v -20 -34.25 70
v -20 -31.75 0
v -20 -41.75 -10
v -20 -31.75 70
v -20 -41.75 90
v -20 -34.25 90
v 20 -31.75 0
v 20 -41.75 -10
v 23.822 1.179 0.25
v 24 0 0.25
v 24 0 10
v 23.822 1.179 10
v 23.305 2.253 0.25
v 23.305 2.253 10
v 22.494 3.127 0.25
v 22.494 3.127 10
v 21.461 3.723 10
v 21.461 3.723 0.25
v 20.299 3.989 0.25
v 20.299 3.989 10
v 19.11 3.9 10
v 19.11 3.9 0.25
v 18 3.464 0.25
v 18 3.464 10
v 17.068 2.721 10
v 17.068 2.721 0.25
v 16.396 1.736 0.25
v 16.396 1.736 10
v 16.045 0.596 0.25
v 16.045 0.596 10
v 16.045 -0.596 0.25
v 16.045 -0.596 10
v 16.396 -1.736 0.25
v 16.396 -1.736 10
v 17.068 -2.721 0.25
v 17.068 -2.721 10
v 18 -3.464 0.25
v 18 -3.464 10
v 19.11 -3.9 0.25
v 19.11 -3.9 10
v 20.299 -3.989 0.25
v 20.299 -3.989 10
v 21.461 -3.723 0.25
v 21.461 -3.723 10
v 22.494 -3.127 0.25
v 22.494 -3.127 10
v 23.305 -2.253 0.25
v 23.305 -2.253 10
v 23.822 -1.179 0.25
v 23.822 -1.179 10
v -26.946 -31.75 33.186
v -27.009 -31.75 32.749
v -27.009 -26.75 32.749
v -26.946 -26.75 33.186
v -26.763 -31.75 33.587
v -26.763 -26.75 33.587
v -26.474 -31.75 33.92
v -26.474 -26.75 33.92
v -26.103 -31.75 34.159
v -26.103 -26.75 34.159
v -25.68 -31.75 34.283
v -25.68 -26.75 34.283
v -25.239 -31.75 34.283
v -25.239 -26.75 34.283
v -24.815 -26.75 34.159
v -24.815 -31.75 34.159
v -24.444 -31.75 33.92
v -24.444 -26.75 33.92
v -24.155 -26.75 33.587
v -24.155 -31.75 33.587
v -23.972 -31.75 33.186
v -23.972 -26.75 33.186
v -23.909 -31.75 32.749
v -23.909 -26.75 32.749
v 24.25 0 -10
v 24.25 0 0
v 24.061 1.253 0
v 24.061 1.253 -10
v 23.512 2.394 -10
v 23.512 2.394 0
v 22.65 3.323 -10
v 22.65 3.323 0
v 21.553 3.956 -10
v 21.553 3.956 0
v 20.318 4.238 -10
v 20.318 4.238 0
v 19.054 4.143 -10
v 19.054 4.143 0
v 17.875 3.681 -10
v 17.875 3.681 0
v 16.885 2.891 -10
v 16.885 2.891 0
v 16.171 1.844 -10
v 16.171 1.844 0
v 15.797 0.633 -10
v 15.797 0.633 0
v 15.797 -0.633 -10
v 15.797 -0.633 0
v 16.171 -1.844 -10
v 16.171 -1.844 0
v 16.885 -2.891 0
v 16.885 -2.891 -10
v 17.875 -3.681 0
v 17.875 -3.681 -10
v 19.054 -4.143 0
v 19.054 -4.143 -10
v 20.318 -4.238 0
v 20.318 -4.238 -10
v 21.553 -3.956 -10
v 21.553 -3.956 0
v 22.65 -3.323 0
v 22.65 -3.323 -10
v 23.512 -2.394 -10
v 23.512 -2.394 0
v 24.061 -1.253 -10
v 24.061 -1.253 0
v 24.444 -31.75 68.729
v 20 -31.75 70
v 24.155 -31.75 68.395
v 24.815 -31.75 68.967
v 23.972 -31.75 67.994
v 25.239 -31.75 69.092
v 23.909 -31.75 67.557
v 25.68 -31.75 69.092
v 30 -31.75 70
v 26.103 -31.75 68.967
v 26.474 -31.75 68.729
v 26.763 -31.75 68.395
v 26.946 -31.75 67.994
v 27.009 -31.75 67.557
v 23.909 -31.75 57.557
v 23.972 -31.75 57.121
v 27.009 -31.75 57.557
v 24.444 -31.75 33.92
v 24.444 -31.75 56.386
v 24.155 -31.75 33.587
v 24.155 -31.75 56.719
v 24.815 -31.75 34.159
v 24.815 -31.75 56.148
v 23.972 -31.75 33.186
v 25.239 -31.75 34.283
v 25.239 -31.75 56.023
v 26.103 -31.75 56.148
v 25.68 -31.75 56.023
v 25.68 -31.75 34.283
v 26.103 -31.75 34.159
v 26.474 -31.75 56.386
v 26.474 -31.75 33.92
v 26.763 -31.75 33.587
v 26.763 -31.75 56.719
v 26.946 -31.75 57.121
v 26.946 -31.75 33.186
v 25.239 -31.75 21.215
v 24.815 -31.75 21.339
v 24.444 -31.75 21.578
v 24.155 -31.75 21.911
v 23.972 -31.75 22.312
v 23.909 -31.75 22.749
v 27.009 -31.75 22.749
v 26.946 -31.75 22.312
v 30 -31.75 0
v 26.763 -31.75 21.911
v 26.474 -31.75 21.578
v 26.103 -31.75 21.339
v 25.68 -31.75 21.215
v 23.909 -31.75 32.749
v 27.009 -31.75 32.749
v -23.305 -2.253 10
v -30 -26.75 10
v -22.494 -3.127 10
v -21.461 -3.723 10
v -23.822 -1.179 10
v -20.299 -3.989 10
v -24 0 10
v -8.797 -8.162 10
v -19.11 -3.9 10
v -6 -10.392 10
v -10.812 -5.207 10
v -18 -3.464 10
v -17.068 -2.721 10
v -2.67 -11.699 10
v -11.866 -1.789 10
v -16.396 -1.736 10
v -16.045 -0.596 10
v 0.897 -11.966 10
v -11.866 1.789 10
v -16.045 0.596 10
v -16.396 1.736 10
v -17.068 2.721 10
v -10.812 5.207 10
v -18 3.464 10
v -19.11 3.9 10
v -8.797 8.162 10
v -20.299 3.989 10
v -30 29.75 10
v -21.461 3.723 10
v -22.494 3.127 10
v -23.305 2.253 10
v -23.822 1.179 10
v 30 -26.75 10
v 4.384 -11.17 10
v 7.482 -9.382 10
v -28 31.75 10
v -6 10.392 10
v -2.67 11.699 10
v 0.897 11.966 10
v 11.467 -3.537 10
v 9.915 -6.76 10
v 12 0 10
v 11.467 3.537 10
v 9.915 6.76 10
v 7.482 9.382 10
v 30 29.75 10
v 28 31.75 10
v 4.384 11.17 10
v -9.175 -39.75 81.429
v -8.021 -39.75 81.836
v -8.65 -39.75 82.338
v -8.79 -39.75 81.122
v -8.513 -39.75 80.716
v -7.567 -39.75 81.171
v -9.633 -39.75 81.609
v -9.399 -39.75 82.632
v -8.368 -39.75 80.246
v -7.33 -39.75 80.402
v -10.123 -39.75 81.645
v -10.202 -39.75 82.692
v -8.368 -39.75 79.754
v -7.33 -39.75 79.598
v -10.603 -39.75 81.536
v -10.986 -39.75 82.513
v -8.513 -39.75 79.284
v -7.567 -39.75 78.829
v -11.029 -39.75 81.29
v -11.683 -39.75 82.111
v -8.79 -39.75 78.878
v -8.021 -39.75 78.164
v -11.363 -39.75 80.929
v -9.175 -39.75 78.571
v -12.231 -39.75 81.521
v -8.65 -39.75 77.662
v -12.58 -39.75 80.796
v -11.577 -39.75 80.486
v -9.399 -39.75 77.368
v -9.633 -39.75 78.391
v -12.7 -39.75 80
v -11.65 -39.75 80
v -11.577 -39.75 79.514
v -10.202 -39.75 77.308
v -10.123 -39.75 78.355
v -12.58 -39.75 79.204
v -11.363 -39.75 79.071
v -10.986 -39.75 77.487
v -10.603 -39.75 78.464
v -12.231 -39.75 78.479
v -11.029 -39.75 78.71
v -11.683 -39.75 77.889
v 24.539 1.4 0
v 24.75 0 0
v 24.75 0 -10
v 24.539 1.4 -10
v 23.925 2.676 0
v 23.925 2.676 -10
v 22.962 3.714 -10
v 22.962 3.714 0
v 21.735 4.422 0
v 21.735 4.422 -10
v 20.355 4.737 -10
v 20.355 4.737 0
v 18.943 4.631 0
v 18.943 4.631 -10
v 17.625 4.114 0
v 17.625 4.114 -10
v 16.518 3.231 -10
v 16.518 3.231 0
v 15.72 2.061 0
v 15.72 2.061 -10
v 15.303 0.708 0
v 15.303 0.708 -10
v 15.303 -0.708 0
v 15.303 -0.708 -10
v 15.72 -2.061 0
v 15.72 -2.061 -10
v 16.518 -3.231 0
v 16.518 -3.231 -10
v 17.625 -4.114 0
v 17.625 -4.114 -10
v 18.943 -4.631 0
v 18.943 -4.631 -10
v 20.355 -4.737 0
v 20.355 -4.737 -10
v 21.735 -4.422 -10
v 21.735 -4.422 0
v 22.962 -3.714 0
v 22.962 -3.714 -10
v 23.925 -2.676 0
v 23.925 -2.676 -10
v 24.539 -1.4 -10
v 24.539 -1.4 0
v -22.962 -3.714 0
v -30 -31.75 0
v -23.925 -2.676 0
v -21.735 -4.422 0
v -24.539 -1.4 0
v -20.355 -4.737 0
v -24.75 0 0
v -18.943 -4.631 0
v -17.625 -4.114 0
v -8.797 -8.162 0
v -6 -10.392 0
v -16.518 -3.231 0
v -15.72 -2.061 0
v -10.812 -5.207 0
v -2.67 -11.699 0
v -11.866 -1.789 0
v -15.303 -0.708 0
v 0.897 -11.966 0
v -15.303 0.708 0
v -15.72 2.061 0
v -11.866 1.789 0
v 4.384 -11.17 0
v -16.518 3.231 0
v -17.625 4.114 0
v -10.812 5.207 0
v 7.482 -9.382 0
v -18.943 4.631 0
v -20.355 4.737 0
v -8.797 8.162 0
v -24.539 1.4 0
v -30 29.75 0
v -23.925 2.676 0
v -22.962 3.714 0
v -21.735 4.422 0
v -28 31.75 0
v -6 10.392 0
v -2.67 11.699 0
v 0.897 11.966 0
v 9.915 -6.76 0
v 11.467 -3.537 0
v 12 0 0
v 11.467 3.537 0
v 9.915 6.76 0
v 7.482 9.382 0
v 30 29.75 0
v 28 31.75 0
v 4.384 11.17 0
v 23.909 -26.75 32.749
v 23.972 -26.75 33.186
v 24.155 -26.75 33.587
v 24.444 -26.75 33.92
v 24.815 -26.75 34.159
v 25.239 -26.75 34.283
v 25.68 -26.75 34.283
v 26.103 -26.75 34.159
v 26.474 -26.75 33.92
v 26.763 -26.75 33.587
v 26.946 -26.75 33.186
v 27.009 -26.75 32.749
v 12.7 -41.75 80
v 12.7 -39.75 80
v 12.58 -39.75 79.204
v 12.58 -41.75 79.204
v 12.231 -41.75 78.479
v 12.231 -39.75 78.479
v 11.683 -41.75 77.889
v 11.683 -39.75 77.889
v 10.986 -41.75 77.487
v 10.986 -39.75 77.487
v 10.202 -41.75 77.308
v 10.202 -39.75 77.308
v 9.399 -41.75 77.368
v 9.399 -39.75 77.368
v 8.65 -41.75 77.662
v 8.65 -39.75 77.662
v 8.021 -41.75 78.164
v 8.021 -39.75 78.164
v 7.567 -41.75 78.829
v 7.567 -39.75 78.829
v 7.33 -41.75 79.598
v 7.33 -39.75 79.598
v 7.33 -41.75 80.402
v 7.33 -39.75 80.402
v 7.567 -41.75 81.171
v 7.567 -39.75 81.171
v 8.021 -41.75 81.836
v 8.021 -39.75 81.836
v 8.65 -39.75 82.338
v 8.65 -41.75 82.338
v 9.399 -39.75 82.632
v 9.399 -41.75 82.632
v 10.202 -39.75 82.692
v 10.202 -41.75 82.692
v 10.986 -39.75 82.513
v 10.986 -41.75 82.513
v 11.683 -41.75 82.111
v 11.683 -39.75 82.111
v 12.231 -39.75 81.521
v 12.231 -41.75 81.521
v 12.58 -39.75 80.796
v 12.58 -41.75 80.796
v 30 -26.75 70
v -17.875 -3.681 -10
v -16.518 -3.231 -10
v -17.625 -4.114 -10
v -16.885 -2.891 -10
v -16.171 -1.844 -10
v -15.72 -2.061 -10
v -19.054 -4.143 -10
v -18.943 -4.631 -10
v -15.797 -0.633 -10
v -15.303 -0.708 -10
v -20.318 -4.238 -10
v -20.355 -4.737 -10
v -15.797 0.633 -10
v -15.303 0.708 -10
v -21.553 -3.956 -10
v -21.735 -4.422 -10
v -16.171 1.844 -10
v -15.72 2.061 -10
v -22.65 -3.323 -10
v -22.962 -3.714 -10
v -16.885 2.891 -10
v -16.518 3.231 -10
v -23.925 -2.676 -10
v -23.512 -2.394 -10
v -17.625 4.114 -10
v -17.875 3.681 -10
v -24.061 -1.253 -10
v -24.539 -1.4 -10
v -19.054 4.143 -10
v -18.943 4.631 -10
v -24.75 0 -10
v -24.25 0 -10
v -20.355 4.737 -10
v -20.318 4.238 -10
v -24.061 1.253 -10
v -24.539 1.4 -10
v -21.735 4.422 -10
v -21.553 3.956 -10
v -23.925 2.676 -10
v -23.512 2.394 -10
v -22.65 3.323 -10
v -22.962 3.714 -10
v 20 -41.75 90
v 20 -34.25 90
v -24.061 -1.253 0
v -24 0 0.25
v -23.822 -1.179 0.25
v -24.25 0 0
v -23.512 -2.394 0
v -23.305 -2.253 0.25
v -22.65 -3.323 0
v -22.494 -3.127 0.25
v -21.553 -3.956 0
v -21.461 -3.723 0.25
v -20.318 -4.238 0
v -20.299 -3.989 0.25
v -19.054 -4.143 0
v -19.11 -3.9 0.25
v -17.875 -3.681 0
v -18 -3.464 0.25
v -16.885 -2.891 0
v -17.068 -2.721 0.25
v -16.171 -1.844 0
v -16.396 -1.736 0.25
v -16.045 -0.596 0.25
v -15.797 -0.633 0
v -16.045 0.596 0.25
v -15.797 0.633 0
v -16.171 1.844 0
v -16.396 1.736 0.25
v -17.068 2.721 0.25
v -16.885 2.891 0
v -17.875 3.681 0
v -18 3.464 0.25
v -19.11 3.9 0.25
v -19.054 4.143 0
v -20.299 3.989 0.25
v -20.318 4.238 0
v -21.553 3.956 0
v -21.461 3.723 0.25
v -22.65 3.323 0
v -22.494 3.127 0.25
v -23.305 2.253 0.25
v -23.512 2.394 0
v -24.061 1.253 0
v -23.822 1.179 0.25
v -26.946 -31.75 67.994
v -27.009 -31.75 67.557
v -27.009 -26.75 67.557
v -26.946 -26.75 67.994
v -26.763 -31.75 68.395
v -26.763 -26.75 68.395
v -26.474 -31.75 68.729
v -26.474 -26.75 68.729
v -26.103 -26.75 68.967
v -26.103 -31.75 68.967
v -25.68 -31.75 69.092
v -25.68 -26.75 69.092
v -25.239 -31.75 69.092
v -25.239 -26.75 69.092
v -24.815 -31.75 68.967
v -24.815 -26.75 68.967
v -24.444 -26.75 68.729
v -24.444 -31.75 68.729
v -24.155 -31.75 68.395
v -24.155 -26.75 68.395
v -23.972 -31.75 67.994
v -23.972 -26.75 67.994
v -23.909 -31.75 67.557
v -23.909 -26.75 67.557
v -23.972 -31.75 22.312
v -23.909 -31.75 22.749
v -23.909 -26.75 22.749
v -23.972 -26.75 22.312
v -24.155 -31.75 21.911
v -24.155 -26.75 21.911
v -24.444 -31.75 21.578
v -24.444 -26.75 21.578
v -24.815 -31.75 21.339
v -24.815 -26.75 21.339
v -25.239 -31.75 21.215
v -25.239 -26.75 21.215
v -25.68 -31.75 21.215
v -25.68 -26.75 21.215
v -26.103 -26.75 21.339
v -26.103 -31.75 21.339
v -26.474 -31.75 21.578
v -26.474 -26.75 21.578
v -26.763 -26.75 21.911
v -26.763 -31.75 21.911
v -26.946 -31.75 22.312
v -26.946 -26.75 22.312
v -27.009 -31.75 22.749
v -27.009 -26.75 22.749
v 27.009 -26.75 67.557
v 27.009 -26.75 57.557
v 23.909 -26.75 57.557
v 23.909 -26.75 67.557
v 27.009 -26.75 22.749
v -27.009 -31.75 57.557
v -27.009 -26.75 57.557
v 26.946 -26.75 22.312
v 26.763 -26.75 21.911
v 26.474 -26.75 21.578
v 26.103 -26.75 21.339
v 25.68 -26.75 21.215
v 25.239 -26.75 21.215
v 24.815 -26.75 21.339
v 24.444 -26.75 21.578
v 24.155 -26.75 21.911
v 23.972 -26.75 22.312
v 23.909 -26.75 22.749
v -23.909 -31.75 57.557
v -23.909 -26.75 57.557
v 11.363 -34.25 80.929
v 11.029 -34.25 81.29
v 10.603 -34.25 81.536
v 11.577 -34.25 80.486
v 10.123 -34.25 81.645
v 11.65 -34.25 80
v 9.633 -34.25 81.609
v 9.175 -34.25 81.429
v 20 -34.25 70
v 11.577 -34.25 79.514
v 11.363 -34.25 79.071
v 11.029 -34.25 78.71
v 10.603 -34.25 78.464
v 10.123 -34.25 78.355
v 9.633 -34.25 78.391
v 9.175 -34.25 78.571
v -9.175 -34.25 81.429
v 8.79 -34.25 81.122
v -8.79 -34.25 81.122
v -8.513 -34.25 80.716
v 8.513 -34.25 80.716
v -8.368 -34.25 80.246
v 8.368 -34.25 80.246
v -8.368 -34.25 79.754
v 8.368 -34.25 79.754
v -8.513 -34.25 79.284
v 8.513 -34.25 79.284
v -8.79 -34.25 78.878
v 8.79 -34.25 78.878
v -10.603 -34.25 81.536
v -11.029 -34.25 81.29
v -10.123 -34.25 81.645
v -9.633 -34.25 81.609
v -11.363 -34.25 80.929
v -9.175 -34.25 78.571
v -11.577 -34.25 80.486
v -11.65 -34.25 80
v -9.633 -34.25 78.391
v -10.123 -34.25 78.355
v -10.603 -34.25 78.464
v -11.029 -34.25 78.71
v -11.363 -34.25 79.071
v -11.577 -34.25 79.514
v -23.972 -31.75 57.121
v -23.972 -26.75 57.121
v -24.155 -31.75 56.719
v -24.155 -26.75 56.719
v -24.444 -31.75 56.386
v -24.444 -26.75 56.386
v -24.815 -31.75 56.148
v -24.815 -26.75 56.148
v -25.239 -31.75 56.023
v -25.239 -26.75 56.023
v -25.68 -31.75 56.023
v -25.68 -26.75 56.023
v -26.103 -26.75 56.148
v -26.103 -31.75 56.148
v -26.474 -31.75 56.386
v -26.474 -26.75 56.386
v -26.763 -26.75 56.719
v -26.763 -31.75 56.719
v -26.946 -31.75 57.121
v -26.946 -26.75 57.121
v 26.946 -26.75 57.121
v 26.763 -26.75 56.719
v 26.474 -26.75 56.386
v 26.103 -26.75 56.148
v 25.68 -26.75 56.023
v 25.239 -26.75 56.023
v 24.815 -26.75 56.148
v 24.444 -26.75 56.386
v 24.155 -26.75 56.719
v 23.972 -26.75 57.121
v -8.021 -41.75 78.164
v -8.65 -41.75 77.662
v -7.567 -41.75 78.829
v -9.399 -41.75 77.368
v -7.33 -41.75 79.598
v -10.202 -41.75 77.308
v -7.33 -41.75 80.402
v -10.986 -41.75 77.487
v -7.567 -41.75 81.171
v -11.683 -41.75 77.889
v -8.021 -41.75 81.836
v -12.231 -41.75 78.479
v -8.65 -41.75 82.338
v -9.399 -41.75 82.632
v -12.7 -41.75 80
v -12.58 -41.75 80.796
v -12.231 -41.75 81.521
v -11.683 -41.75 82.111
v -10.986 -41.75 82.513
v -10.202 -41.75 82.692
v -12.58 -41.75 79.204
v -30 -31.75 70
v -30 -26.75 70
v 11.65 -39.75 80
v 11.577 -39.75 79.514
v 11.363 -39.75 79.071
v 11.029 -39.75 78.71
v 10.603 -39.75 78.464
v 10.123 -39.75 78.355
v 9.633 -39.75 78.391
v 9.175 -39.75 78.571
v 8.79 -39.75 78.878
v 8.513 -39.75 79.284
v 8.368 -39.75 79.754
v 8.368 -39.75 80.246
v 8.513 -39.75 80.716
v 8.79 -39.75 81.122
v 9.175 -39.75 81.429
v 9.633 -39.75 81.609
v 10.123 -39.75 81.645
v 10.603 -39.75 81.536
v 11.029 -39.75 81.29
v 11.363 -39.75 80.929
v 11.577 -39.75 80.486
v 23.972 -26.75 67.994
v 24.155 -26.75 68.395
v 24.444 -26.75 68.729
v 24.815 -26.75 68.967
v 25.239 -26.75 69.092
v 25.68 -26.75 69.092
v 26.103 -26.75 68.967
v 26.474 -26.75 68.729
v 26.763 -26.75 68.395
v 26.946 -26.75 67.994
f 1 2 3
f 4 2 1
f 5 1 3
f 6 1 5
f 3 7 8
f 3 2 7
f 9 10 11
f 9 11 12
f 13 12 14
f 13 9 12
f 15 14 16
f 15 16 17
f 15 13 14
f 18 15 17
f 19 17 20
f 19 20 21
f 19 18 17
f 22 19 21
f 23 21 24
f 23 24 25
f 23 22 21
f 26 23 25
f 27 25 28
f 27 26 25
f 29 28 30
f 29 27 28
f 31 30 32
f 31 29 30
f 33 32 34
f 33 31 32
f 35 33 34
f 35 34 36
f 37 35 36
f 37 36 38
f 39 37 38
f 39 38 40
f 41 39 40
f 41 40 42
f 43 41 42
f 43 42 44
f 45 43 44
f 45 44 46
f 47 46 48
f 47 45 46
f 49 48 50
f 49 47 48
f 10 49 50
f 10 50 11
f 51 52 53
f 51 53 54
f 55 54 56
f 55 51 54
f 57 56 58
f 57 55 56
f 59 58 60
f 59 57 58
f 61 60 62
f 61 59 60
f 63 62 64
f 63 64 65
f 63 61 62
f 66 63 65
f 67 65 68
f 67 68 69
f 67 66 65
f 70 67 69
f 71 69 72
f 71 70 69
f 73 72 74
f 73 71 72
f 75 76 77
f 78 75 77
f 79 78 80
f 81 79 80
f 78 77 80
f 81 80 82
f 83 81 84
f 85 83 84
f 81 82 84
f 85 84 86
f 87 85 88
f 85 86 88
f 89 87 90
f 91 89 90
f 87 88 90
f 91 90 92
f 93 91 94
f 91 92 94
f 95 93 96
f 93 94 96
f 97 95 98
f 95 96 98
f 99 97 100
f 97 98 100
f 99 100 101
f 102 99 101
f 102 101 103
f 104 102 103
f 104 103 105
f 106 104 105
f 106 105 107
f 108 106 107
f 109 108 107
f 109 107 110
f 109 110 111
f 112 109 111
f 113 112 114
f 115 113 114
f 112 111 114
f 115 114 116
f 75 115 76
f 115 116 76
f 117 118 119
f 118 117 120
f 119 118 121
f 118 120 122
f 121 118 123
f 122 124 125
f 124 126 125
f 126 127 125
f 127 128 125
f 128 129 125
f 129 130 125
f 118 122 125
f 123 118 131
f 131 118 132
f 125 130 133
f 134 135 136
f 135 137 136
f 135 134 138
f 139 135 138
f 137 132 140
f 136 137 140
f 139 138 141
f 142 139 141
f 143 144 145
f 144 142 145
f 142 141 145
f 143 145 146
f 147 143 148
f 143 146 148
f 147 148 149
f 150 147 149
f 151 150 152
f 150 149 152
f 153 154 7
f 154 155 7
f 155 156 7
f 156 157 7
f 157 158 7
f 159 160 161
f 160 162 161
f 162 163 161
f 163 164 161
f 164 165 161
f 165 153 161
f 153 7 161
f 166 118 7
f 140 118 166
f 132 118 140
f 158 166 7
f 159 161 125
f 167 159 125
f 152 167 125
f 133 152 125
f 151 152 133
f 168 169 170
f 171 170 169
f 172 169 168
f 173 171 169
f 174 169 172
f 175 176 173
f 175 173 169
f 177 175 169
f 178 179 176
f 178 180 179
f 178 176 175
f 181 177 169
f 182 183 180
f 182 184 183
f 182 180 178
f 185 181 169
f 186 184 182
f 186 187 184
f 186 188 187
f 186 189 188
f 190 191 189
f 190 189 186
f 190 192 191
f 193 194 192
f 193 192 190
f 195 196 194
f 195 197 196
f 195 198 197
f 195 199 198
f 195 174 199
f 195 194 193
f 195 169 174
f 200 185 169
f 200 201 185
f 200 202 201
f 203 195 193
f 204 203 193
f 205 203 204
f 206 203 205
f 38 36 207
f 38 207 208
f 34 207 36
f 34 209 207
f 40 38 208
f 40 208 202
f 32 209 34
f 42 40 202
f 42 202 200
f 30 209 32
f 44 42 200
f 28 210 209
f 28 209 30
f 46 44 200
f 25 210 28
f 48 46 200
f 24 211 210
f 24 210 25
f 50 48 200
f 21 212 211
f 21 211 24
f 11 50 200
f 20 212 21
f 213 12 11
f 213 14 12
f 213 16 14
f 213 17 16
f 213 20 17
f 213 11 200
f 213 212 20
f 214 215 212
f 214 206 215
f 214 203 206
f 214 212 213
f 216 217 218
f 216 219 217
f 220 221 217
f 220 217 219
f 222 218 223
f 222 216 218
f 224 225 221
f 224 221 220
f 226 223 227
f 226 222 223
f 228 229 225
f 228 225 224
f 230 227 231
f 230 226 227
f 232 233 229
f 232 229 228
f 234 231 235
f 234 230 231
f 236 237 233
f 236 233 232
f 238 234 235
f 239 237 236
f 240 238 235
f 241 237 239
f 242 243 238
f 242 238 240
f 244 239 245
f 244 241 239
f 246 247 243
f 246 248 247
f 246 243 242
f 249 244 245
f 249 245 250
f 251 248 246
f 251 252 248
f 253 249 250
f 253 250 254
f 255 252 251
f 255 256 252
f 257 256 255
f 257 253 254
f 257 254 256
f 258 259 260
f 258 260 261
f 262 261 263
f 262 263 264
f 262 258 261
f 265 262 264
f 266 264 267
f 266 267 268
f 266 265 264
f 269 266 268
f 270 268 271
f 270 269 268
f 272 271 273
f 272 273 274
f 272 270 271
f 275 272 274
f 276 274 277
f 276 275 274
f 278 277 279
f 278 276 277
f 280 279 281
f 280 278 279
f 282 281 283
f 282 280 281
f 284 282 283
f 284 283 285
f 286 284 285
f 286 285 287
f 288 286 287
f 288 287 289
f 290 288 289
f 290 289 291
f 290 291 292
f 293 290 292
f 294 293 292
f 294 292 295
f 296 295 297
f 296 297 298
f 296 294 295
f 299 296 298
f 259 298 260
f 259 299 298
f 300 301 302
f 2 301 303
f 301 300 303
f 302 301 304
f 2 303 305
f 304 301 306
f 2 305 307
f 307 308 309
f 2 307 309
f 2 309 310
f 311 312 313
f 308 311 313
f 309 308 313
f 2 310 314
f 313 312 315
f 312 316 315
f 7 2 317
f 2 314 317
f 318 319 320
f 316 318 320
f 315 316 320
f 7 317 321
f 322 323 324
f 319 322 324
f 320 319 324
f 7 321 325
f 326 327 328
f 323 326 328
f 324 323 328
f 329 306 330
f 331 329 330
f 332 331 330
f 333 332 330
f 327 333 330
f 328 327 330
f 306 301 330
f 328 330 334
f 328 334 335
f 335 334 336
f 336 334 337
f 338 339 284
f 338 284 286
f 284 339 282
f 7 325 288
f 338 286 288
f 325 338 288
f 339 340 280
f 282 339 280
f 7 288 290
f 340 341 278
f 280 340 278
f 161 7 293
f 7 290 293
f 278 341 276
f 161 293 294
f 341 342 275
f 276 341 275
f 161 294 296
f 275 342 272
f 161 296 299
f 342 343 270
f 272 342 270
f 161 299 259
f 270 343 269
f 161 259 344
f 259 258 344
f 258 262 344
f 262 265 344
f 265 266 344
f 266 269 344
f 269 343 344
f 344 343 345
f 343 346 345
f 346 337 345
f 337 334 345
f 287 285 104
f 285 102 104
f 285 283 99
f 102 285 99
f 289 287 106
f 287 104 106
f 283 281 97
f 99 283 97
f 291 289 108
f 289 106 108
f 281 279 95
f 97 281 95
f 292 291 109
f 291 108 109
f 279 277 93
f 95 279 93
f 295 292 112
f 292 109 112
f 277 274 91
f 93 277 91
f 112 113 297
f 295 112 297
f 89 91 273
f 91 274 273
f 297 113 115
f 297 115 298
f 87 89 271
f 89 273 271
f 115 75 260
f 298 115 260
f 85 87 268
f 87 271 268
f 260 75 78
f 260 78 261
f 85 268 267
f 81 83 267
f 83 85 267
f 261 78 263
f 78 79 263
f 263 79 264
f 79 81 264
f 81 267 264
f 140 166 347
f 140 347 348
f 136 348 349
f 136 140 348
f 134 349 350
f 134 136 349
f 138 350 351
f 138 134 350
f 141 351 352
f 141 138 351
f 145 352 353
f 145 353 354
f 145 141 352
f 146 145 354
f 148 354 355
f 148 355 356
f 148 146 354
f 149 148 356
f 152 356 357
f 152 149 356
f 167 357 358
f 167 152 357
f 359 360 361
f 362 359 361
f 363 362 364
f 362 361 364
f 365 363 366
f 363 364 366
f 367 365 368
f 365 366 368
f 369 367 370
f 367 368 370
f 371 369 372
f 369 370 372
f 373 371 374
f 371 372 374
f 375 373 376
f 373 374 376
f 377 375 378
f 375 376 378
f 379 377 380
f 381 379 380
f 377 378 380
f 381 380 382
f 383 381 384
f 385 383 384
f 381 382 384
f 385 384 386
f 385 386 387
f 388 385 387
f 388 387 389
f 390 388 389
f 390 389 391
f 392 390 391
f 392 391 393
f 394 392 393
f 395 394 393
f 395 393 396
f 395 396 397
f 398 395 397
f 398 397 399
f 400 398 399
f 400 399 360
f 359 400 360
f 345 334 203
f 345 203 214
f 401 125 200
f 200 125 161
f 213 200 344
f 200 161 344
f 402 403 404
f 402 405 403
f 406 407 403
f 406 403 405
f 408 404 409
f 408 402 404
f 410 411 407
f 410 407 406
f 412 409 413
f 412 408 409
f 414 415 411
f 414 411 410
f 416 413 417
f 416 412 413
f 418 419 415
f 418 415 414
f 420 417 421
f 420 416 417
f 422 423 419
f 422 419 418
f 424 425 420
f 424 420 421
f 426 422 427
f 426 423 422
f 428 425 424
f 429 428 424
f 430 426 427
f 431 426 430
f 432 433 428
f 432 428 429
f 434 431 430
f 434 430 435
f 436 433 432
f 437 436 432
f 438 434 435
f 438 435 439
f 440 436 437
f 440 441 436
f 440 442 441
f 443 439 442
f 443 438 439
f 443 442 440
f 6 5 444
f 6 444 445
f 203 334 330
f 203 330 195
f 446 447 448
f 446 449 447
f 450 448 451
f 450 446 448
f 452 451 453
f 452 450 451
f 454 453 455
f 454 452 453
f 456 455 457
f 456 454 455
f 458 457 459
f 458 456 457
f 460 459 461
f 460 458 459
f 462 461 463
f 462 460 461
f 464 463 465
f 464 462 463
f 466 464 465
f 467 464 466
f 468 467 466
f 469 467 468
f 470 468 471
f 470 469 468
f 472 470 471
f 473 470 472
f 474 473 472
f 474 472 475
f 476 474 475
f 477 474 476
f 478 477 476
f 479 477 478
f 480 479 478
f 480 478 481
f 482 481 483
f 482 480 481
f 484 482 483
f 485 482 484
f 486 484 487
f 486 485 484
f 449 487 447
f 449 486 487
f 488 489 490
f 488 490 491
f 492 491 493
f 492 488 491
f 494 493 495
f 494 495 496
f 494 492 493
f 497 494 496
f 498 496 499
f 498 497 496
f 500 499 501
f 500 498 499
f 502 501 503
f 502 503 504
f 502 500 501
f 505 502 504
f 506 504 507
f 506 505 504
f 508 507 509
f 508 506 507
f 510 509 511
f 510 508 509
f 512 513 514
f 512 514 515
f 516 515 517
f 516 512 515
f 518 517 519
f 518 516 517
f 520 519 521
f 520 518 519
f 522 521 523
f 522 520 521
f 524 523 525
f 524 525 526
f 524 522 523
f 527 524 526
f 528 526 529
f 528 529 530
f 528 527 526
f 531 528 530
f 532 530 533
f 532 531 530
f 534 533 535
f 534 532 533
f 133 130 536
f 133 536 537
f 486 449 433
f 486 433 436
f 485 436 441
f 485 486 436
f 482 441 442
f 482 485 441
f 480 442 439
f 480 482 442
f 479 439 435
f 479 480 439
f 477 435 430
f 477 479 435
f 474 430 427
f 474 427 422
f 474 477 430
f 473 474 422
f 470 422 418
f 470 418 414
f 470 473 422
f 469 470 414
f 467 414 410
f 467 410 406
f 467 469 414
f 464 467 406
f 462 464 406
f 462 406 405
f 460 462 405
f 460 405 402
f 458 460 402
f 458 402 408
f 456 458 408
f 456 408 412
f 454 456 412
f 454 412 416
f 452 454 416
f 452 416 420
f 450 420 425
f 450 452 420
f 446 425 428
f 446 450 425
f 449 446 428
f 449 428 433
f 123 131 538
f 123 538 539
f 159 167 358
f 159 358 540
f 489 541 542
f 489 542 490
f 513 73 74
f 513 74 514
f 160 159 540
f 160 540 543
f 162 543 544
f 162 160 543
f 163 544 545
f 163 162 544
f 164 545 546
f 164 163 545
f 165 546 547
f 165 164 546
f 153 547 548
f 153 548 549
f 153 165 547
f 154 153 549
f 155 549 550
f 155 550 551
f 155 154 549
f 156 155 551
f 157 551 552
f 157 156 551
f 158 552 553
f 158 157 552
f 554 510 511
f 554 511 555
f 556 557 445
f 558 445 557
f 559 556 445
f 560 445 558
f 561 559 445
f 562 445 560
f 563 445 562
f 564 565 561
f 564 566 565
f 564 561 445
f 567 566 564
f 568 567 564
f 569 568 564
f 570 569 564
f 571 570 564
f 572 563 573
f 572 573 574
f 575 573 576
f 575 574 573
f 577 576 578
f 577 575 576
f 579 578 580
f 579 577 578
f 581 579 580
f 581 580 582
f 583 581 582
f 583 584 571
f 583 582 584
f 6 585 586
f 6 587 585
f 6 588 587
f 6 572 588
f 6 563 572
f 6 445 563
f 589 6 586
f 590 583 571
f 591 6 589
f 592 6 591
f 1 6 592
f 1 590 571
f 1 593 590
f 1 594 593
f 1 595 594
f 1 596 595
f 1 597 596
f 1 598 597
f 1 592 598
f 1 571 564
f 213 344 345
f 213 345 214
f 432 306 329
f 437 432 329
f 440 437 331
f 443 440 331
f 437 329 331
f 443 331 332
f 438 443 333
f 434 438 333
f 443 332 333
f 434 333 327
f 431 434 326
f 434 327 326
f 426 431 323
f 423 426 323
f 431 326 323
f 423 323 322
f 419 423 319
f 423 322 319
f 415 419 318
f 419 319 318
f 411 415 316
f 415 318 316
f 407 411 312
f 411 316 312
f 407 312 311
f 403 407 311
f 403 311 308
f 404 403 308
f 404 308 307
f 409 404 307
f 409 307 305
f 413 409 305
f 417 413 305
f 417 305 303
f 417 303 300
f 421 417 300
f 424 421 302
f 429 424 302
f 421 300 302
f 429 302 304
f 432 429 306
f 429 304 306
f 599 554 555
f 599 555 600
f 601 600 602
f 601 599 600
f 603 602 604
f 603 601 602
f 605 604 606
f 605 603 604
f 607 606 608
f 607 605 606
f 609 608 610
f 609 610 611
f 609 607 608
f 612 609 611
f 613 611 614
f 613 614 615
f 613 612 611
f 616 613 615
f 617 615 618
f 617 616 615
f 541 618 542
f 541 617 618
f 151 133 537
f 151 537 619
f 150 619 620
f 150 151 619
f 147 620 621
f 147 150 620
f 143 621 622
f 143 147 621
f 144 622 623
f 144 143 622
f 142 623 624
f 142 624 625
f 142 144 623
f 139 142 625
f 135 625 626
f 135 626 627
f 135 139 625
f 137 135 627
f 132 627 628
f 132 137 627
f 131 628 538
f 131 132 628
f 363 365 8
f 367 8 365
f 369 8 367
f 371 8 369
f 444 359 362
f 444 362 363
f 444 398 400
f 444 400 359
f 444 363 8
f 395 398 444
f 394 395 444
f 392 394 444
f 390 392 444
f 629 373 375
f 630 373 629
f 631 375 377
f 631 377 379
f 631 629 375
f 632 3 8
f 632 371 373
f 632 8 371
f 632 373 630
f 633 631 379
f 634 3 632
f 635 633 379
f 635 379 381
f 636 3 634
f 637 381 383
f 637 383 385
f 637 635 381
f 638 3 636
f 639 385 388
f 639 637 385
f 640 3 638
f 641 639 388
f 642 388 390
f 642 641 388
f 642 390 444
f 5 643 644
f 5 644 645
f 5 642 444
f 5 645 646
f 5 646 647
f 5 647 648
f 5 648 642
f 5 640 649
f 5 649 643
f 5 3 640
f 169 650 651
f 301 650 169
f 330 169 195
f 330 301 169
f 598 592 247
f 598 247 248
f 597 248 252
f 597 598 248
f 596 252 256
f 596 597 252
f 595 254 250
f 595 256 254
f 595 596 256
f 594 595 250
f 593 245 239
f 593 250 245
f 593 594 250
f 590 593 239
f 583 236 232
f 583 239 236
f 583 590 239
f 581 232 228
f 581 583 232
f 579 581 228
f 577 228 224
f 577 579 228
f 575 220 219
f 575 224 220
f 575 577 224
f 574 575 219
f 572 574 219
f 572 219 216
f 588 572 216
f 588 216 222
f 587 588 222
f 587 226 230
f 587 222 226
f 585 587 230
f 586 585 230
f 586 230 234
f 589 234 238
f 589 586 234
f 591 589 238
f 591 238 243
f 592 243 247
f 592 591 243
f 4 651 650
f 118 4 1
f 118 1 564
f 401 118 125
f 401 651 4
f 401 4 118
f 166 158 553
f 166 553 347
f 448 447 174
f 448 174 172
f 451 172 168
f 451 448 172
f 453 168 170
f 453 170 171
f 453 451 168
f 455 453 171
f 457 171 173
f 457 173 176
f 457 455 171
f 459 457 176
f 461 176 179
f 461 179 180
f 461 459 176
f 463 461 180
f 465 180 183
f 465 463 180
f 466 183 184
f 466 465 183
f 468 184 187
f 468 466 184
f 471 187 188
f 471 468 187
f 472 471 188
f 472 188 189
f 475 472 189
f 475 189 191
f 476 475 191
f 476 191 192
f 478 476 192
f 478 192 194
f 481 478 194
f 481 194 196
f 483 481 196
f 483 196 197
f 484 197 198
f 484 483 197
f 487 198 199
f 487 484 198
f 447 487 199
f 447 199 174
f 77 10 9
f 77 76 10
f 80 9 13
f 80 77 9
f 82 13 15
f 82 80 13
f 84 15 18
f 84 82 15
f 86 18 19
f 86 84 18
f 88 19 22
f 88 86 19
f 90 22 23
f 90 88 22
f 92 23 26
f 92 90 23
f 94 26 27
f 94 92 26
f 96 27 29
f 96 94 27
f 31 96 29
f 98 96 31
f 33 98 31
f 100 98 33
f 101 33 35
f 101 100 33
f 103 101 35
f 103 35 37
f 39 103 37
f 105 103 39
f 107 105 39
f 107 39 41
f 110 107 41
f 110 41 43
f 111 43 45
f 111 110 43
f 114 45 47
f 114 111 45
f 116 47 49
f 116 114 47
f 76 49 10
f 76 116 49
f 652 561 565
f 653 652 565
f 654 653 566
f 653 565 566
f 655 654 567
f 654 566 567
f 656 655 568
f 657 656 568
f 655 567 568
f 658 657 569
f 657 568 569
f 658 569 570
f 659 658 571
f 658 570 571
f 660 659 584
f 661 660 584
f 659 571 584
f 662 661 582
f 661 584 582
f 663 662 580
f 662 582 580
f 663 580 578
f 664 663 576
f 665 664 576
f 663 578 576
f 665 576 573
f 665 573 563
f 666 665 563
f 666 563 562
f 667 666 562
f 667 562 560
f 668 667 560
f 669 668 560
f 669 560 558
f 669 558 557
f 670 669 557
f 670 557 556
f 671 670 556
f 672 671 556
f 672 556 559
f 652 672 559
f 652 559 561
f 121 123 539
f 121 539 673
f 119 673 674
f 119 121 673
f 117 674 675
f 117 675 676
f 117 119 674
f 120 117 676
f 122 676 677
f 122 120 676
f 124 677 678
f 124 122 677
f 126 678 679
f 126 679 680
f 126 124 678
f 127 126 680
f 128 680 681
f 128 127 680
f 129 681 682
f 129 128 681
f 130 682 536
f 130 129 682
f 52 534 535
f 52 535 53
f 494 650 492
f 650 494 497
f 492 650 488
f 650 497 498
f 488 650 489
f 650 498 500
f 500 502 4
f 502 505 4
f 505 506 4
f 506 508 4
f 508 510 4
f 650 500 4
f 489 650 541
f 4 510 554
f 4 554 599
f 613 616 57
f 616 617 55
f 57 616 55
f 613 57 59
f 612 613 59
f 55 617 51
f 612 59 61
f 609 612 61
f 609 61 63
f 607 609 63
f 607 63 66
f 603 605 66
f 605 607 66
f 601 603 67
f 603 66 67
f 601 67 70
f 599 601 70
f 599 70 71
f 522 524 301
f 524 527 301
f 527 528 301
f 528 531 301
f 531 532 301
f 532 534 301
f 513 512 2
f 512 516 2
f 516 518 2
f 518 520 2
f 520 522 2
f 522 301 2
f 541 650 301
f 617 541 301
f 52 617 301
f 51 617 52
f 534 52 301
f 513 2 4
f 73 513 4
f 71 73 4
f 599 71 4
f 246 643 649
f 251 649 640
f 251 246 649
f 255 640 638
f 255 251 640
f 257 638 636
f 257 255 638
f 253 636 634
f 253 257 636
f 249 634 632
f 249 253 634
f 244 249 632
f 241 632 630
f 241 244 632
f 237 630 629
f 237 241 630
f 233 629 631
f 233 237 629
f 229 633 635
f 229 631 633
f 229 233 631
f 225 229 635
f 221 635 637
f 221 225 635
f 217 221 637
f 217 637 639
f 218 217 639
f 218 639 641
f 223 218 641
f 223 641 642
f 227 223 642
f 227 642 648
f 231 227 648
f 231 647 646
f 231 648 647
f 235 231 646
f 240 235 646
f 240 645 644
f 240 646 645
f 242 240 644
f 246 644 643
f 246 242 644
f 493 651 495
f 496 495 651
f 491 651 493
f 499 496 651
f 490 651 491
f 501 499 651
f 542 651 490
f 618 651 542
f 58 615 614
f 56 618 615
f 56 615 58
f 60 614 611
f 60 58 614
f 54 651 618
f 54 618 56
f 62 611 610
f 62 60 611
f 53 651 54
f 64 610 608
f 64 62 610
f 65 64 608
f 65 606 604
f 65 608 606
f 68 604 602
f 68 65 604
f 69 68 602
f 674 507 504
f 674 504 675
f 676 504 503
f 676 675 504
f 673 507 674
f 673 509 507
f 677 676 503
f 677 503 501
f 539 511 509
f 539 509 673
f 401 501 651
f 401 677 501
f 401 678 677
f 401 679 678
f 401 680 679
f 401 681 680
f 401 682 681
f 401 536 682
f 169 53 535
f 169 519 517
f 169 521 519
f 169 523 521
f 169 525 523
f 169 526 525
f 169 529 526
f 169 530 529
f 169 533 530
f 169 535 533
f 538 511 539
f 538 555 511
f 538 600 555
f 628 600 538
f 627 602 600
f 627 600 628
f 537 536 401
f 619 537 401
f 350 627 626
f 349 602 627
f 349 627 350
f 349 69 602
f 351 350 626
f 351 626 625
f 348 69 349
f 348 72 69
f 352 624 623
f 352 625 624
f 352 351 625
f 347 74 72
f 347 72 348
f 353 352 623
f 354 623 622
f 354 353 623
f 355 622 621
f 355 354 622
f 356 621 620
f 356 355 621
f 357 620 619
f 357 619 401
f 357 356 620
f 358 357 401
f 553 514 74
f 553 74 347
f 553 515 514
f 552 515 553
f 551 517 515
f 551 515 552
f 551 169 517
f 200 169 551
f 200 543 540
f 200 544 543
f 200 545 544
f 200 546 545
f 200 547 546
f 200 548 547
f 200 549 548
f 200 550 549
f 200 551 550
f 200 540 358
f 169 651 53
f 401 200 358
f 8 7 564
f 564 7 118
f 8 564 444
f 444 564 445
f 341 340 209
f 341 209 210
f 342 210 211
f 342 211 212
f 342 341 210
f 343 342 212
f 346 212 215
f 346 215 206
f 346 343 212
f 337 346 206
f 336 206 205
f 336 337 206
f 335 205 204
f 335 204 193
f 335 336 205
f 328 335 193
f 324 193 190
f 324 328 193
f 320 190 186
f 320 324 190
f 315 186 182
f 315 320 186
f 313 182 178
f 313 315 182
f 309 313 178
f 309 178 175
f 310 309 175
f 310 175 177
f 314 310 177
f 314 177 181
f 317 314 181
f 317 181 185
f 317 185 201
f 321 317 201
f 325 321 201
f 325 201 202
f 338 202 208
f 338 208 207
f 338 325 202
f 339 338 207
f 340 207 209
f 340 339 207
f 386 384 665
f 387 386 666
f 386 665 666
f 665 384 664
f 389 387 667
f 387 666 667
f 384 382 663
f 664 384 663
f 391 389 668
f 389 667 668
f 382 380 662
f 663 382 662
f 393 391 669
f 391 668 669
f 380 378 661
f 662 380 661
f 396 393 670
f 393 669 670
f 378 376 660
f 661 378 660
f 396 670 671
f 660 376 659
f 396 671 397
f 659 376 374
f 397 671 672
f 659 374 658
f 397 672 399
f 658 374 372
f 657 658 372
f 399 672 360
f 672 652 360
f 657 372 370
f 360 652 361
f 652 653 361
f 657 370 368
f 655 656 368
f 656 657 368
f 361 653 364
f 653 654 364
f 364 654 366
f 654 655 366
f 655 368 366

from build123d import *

# Parameters (mm, degrees)
SKETCH_1_W          = 60
SKETCH_1_H          = 63.5
SKETCH_1_R          = 12
SKETCH_1_R_2        = 4
EXTRUDE_1_DEPTH     = 10
CHAMFER_1_SIZE      = 0.25
SKETCH_2_W          = 60
SKETCH_2_H          = 5
EXTRUDE_2_DEPTH     = 60
MM_START            = -31.75
MM_1_DEPTH          = 5
SKETCH_8_R          = 4.75
SKETCH_8_R_2        = 4.25
EXTRUDE_3_DEPTH     = 10
EXTRUDE_4_DEPTH     = 20
CHAMFER_4_SIZE      = 2
HOLE_WIZARD_2_D     = 5.4
HOLE_WIZARD_2_DEPTH = 2
HOLE_WIZARD_3_D     = 3.3


# Read off the part's stored shape, not the designer's step: 大小mm 暗销槽口1
with BuildPart() as part:
    # 草图1 → 凸台-拉伸1 (new body)
    with BuildSketch(Plane.XY):
        Rectangle(SKETCH_1_W, SKETCH_1_H)
        Circle(SKETCH_1_R, mode=Mode.SUBTRACT)
        with Locations((20, 0)):
            Circle(SKETCH_1_R_2, mode=Mode.SUBTRACT)
        with Locations(Location((-20, 0, 0), (0, 0, 180))):
            Circle(SKETCH_1_R_2, mode=Mode.SUBTRACT)
    extrude(amount=EXTRUDE_1_DEPTH)

    # 倒角1
    chamfer_1_edges = [part.edges().sort_by_distance(p)[0] for p in [
        (16, 0, 0),
        (-16, 0, 0),
    ]]
    chamfer(chamfer_1_edges, length=CHAMFER_1_SIZE)

    # 草图2 → 凸台-拉伸2 (add)
    with BuildSketch(Plane.XY.offset(10)):
        with Locations((0, -29.25)):
            Rectangle(SKETCH_2_W, SKETCH_2_H)
    extrude(amount=EXTRUDE_2_DEPTH)

    # 大小mm 暗销槽口1 outline → 大小mm 暗销槽口1 (cut)
    with BuildSketch(Plane(origin=(0, 0, 0), x_dir=(1, 0, 0), z_dir=(0, 1, 0)).offset(MM_START)):
        with BuildLine():
            ThreePointArc((23.909259259, -32.749042146), (25.459259259, -34.299042146), (27.009259259, -32.749042146))
            Line((27.009259259, -32.749042146), (27.009259259, -22.749042146))
            ThreePointArc((27.009259259, -22.749042146), (25.459259259, -21.199042146), (23.909259259, -22.749042146))
            Line((23.909259259, -22.749042146), (23.909259259, -32.749042146))
        make_face()
        with BuildLine():
            Line((27.009259259, -67.557471264), (27.009259259, -57.557471264))
            ThreePointArc((27.009259259, -57.557471264), (25.459259259, -56.007471264), (23.909259259, -57.557471264))
            Line((23.909259259, -57.557471264), (23.909259259, -67.557471264))
            ThreePointArc((23.909259259, -67.557471264), (25.459259259, -69.107471264), (27.009259259, -67.557471264))
        make_face()
        with BuildLine():
            Line((-23.909259259, -67.557471264), (-23.909259259, -57.557471264))
            ThreePointArc((-23.909259259, -57.557471264), (-25.459259259, -56.007471264), (-27.009259259, -57.557471264))
            Line((-27.009259259, -57.557471264), (-27.009259259, -67.557471264))
            ThreePointArc((-27.009259259, -67.557471264), (-25.459259259, -69.107471264), (-23.909259259, -67.557471264))
        make_face()
        with BuildLine():
            Line((-23.909259259, -32.749042146), (-23.909259259, -22.749042146))
            ThreePointArc((-23.909259259, -22.749042146), (-25.459259259, -21.199042146), (-27.009259259, -22.749042146))
            Line((-27.009259259, -22.749042146), (-27.009259259, -32.749042146))
            ThreePointArc((-27.009259259, -32.749042146), (-25.459259259, -34.299042146), (-23.909259259, -32.749042146))
        make_face()
    extrude(amount=MM_1_DEPTH, mode=Mode.SUBTRACT)

    # 草图8 → 凸台-拉伸3 (add)
    with BuildSketch(Plane(origin=(0, 0, 0), x_dir=(-1, 0, 0), z_dir=(0, 0, -1))):
        with Locations((20, 0)):
            Circle(SKETCH_8_R)
        with Locations((20, 0)):
            Circle(SKETCH_8_R_2, mode=Mode.SUBTRACT)
    extrude_3 = extrude(amount=EXTRUDE_3_DEPTH)

    # 镜向1: 凸台-拉伸3 across plane
    add(extrude_3.mirror(Plane.ZY))

    # 草图9 → 凸台-拉伸4 (add, symmetric)
    with BuildSketch(Plane.ZY):
        Polygon((0, -31.75), (-10, -41.75), (90, -41.75), (90, -34.25), (70, -34.25), (70, -31.75), align=None)
    extrude(amount=EXTRUDE_4_DEPTH, both=True)

    # 倒角4
    chamfer_4_edges = [part.edges().sort_by_distance(p)[0] for p in [
        (-30, 31.75, 5),
        (30, 31.75, 5),
    ]]
    chamfer(chamfer_4_edges, length=CHAMFER_4_SIZE)

    # 孔2
    with Locations(Plane(origin=(0, -41.75, 0), x_dir=(-1, 0, 0), z_dir=(0, -1, 0))):
        with Locations((-10, -80)):
            hole_wizard_2 = Hole(HOLE_WIZARD_2_D / 2, depth=HOLE_WIZARD_2_DEPTH)

    # 孔3 (through all)
    with Locations(Plane(origin=(0, -41.75, 0), x_dir=(-1, 0, 0), z_dir=(0, -1, 0))):
        with Locations((-10, -80)):
            hole_wizard_3 = Hole(HOLE_WIZARD_3_D / 2)

    # 镜向2: 孔2, 孔3 across plane
    add(hole_wizard_2.mirror(Plane.ZY), mode=Mode.SUBTRACT)
    add(hole_wizard_3.mirror(Plane.ZY), mode=Mode.SUBTRACT)


solid = part.part
